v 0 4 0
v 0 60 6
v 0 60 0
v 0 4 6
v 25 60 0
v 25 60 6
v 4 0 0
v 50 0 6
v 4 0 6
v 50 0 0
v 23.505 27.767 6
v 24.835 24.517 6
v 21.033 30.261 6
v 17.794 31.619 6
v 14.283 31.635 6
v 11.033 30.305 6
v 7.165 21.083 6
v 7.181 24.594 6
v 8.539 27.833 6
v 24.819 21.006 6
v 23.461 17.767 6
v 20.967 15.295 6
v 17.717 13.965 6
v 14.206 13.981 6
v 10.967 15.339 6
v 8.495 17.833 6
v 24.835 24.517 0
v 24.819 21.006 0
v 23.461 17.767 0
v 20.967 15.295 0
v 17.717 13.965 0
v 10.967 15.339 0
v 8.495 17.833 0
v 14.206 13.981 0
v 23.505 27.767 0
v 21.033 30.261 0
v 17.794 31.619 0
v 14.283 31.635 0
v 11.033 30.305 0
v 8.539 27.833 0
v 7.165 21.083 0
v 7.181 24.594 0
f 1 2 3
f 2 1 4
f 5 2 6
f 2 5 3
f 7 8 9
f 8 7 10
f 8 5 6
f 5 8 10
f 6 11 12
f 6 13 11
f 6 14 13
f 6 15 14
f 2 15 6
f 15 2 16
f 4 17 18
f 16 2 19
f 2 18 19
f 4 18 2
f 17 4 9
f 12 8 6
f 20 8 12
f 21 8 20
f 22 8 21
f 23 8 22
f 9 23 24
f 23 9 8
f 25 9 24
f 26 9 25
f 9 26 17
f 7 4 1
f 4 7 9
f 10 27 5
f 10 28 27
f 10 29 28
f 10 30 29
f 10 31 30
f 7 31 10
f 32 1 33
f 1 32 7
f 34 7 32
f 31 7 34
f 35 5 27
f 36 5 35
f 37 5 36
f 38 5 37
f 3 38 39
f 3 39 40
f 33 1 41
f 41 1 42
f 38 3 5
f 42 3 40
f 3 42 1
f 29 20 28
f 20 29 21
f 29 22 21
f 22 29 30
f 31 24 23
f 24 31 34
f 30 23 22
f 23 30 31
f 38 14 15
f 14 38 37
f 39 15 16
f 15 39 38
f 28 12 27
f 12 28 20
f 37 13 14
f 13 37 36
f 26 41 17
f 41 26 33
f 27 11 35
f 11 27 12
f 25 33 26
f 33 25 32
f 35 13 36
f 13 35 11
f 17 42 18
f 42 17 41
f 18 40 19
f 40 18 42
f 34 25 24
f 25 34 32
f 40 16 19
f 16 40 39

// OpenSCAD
$fn = 32;

// ----------------------------------------------------------------------
// Bracket plate: gusset 50 x 60
// ----------------------------------------------------------------------

// --- parameters (mm) ---
hole_r = 4;               // bolt hole radius
plate_t = 6;              // plate thickness, Z (extrusion height)
gus_a = 50;               // base length
gus_b = 60;               // height
top_x = 25;               // top edge X of the angled cut
light_r = 9;              // lightening hole radius

light_d = 2 * light_r;

profile = [[4, 0], [25, 0], [50, 0], [25, 60], [0, 60], [0, 4]];  // primary outline, 6 points, counter clockwise
void_1 = [[24.835, 24.517], [23.505, 27.767], [21.033, 30.261], [17.794, 31.619], [14.283, 31.635], [11.033, 30.305], [8.539, 27.833], [7.181, 24.594], [7.165, 21.083], [8.495, 17.833], [10.967, 15.339], [14.206, 13.981], [17.717, 13.965], [20.967, 15.295], [23.461, 17.767], [24.819, 21.006]];  // lightening hole, 16 points

// --- the one profile operation ---
difference() {
  linear_extrude(height = plate_t) polygon(points = profile);
  translate([0, 0, -1])
    linear_extrude(height = plate_t + 2) polygon(points = void_1);
}
